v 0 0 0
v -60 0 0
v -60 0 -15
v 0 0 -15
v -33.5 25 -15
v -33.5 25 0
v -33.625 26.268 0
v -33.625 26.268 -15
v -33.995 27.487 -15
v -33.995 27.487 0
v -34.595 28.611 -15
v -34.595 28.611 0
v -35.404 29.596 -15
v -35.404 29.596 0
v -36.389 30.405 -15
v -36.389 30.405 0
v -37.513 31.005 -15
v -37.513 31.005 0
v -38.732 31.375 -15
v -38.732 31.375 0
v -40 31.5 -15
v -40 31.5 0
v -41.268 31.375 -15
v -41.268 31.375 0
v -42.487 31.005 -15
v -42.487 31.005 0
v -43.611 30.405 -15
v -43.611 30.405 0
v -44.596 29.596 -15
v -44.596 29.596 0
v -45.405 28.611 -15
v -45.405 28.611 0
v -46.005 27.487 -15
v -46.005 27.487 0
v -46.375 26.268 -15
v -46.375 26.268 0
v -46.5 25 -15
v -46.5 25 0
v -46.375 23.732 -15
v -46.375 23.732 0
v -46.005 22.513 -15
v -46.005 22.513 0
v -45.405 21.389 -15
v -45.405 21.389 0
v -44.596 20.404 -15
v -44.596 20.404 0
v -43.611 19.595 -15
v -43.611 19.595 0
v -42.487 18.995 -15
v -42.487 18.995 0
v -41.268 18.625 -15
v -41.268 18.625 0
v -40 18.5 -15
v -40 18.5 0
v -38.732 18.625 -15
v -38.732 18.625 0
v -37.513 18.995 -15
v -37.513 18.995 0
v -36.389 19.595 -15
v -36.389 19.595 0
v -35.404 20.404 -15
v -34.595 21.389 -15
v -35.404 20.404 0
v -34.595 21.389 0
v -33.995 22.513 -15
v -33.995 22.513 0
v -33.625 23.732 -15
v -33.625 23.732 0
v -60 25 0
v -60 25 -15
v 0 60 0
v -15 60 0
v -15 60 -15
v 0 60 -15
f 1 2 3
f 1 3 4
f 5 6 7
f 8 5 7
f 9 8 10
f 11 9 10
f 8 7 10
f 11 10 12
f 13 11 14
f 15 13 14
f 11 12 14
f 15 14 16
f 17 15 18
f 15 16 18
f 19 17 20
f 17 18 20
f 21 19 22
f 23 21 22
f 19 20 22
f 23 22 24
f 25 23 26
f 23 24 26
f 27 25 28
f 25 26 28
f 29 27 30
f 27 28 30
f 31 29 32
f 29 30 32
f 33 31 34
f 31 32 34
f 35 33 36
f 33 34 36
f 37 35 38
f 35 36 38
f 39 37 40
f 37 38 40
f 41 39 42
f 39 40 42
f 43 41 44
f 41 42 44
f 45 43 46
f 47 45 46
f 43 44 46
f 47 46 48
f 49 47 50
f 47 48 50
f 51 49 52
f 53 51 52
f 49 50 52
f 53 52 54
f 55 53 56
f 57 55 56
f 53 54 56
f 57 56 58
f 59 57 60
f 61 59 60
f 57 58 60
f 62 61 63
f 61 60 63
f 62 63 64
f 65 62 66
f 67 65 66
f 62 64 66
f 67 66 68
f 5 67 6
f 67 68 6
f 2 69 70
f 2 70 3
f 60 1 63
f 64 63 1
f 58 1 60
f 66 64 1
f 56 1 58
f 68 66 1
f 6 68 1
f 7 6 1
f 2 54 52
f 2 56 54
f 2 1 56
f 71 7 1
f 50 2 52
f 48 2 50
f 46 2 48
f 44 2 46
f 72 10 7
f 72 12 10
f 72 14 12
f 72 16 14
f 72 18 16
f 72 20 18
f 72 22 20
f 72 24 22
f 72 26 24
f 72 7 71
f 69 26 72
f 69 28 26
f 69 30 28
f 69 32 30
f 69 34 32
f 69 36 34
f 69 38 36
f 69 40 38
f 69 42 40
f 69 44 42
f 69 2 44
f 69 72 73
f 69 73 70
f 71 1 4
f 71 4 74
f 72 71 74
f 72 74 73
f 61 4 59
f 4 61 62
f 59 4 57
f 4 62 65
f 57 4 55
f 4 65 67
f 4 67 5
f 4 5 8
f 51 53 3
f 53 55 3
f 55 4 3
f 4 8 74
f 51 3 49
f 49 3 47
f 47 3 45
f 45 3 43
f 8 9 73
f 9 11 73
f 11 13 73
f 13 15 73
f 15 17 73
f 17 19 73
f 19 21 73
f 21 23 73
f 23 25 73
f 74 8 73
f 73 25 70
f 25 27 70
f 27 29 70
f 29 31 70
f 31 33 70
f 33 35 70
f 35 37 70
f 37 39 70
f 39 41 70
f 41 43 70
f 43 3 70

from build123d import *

# Parameters (mm, degrees)
SKETCH1_R           = 6.5
BOSS_EXTRUDE2_DEPTH = 15


with BuildPart() as part:
    # Sketch1 → Boss-Extrude2 (new body)
    with BuildSketch(Plane(origin=(0, 0, 0), x_dir=(0, 1, 0), z_dir=(0, 0, 1))):
        Polygon((0, 60), (0, 0), (60, 0), (60, 15), (25, 60), align=None)
        with Locations(Location((25, 40, 0), (0, 0, 270))):
            Circle(SKETCH1_R, mode=Mode.SUBTRACT)
    extrude(amount=-BOSS_EXTRUDE2_DEPTH)


solid = part.part
